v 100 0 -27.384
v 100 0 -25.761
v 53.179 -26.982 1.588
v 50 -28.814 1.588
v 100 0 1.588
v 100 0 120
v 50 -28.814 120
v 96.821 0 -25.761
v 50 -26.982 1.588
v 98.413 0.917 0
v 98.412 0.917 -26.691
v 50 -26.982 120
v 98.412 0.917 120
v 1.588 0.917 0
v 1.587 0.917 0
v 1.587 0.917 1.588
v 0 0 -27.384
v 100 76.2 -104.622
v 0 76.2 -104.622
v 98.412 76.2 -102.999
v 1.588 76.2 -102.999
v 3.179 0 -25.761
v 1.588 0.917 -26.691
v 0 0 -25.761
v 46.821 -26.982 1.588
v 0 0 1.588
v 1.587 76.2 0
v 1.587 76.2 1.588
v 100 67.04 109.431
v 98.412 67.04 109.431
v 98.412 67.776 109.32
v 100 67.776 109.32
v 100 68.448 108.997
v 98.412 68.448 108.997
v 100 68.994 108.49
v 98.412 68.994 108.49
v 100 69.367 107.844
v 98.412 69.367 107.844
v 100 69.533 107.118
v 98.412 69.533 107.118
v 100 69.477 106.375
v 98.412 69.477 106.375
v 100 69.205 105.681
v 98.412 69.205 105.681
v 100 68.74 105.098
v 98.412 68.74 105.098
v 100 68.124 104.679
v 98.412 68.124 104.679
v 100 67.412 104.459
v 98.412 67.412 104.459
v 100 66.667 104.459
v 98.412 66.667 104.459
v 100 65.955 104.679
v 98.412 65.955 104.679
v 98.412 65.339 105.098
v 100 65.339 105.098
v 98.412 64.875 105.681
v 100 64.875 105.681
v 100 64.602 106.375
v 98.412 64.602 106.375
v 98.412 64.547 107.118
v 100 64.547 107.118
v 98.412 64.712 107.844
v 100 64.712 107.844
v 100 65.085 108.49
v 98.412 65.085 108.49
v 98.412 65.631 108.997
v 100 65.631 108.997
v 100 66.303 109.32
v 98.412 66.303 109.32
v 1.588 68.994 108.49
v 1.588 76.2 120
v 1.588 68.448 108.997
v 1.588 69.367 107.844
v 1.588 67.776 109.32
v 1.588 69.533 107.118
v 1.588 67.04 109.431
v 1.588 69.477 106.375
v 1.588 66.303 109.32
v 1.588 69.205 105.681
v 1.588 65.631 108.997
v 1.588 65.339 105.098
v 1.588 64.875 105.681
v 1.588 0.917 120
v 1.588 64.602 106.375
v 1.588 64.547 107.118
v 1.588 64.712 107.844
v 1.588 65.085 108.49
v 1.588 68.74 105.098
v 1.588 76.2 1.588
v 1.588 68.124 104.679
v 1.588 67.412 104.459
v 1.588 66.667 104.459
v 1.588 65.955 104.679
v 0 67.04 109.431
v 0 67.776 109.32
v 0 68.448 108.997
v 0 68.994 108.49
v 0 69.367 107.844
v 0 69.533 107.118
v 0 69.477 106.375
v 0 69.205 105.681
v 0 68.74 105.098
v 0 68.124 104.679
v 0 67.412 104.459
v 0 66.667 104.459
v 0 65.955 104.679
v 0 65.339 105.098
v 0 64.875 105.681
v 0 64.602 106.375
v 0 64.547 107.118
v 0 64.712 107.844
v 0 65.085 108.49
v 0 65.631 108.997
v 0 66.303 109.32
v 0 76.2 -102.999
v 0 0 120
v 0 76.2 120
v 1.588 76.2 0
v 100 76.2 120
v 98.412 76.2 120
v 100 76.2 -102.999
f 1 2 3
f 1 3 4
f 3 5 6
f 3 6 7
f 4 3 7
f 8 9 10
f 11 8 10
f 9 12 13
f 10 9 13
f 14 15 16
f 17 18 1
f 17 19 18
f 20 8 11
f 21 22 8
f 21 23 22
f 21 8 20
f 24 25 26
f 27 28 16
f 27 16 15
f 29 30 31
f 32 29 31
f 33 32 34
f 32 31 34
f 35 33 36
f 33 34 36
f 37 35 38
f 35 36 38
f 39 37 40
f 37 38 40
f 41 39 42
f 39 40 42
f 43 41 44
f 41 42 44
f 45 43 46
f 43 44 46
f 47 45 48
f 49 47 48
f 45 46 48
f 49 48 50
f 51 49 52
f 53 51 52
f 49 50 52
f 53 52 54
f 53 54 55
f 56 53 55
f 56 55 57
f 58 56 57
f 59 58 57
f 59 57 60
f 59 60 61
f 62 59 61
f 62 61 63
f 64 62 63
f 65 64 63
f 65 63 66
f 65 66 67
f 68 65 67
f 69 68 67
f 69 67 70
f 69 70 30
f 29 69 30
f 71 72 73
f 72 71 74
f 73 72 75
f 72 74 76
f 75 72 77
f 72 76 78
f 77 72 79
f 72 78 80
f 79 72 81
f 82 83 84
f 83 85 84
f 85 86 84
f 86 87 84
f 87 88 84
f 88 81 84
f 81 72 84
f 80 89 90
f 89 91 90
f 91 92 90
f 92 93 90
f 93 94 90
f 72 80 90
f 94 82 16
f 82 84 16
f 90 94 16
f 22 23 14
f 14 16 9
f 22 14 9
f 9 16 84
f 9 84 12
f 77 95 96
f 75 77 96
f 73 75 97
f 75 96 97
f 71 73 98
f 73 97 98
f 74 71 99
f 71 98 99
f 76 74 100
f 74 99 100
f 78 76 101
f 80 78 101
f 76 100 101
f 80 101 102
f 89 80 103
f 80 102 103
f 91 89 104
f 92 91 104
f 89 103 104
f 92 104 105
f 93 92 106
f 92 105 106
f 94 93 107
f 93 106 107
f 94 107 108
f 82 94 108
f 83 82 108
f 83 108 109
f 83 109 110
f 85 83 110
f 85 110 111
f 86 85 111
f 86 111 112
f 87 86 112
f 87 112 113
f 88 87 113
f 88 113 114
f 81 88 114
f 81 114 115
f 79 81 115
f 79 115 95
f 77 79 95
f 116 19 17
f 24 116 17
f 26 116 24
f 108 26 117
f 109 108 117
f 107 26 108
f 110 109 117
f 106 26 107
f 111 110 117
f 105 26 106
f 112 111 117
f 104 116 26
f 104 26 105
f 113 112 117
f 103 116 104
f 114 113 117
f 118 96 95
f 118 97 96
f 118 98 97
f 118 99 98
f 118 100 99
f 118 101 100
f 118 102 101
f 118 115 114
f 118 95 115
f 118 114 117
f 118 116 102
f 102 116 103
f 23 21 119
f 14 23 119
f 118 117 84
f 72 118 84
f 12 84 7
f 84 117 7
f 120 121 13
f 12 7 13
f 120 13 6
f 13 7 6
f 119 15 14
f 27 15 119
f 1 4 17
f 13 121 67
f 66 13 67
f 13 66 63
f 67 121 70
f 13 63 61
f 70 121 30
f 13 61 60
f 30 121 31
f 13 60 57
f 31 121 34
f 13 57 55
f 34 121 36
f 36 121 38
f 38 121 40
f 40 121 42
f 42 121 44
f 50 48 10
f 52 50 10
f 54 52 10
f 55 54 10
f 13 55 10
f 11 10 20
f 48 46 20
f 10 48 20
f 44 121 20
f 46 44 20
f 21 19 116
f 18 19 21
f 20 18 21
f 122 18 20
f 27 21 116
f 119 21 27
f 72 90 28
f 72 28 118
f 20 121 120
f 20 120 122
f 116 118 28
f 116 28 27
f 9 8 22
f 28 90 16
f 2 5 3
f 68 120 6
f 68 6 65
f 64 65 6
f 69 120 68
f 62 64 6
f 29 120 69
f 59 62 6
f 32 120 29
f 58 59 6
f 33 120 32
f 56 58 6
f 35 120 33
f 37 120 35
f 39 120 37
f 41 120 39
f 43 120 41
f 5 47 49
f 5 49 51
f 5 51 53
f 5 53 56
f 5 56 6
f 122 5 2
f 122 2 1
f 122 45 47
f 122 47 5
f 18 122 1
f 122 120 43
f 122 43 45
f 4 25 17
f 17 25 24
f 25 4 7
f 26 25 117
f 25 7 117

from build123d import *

# Parameters (mm, degrees)
BOSS_EXTRUDE2_DEPTH             = 76.2
BOSS_EXTRUDE3_DEPTH             = 118.4125
SKETCH5_W                       = 96.825174549
SKETCH5_H                       = 1.5875
CUT_EXTRUDE2_DEPTH              = 76.2
BOSS_EXTRUDE5_REACH             = 52
BOSS_EXTRUDE5_DIRECTION_2_REACH = 52
BOSS_EXTRUDE6_REACH             = 122.202
BOSS_EXTRUDE7_DEPTH             = 1.5875
BOSS_EXTRUDE8_DEPTH             = 1.5875
SKETCH15_W                      = 143.32634152
SKETCH15_H                      = 53.255725939
CUT_EXTRUDE3_DEPTH              = 264.5875
CUT_EXTRUDE4_DEPTH              = 264.5875
SKETCH18_R                      = 2.5
CUT_EXTRUDE5_DEPTH              = 264.5875


with BuildPart() as part:
    # Sketch1 → Boss-Extrude2 (new body)
    with BuildSketch(Plane(origin=(0, 0, 0), x_dir=(1, 0, 0), z_dir=(0, 1, 0))):
        Polygon((1.5875, -1.5875), (98.4125, -1.5875), (98.4125, -118.4125), (98.4125, -120), (100, -120), (100, 0), (0, 0), (0, -120), (1.5875, -120), (1.5875, -118.4125), align=None)
    extrude(amount=BOSS_EXTRUDE2_DEPTH)

    # Sketch2 → Boss-Extrude3 (add)
    with BuildSketch(Plane.XY.offset(120)):
        Polygon((0, 0), (1.5875, 0.917396042), (50, -26.981614962), (98.4125, 0.917396042), (100, 0), (50, -28.813850766), align=None)
    extrude(amount=-BOSS_EXTRUDE3_DEPTH)

    # Sketch5 → Cut-Extrude2 (cut)
    with BuildSketch(Plane(origin=(0, 76.2, 0), x_dir=(1, 0, 0), z_dir=(0, 1, 0))):
        with Locations((49.999912726, -0.79375)):
            Rectangle(SKETCH5_W, SKETCH5_H)
    extrude(amount=-CUT_EXTRUDE2_DEPTH, mode=Mode.SUBTRACT)

    # Boss-Extrude5: up to this face of the body (flat: up to its plane)
    boss_extrude5_end = Plane(part.part.faces().sort_by_distance((0, 38.1, 60))[0])
    # Sketch11 → Boss-Extrude5 (add, up to the picked face)
    with BuildSketch(Plane.ZY.offset(-50), mode=Mode.PRIVATE) as boss_extrude5_sk1:
        Polygon((1.5875, -26.981614962), (1.5875, -28.813850766), (-27.384499219, 0), (-25.76142568, 0), align=None)
    boss_extrude5_tool1 = split(extrude(boss_extrude5_sk1.sketch, amount=BOSS_EXTRUDE5_REACH, mode=Mode.PRIVATE), bisect_by=boss_extrude5_end, keep=Keep.BOTH, mode=Mode.PRIVATE)
    add(boss_extrude5_tool1.solids().sort_by_distance((50, -14.256717, -12.190864))[0])
    # Sketch11 → Boss-Extrude5 (add, up to the picked face)
    with BuildSketch(Plane.ZY.offset(-50), mode=Mode.PRIVATE) as boss_extrude5_sk2:
        Polygon((-27.384499219, 0), (-25.76142568, 0), (-117.814066128, 90.816324189), (-118.614630338, 90.004861602), align=None)
    boss_extrude5_tool2 = split(extrude(boss_extrude5_sk2.sketch, amount=BOSS_EXTRUDE5_REACH, mode=Mode.PRIVATE), bisect_by=boss_extrude5_end, keep=Keep.BOTH, mode=Mode.PRIVATE)
    add(boss_extrude5_tool2.solids().sort_by_distance((50, 45.2056, -72.392749))[0])

    # Boss-Extrude5 direction 2: up to this face of the body (flat: up to its plane)
    boss_extrude5_direction_2_end = Plane(part.part.faces().sort_by_distance((100, 38.1, 60))[0])
    # Sketch11 → Boss-Extrude5 direction 2 (add, up to the picked face)
    with BuildSketch(Plane.ZY.offset(-50), mode=Mode.PRIVATE) as boss_extrude5_direction_2_sk1:
        Polygon((1.5875, -26.981614962), (1.5875, -28.813850766), (-27.384499219, 0), (-25.76142568, 0), align=None)
    boss_extrude5_direction_2_tool1 = split(extrude(boss_extrude5_direction_2_sk1.sketch, amount=-BOSS_EXTRUDE5_DIRECTION_2_REACH, mode=Mode.PRIVATE), bisect_by=boss_extrude5_direction_2_end, keep=Keep.BOTH, mode=Mode.PRIVATE)
    add(boss_extrude5_direction_2_tool1.solids().sort_by_distance((50, -14.256717, -12.190864))[0])
    # Sketch11 → Boss-Extrude5 direction 2 (add, up to the picked face)
    with BuildSketch(Plane.ZY.offset(-50), mode=Mode.PRIVATE) as boss_extrude5_direction_2_sk2:
        Polygon((-27.384499219, 0), (-25.76142568, 0), (-117.814066128, 90.816324189), (-118.614630338, 90.004861602), align=None)
    boss_extrude5_direction_2_tool2 = split(extrude(boss_extrude5_direction_2_sk2.sketch, amount=-BOSS_EXTRUDE5_DIRECTION_2_REACH, mode=Mode.PRIVATE), bisect_by=boss_extrude5_direction_2_end, keep=Keep.BOTH, mode=Mode.PRIVATE)
    add(boss_extrude5_direction_2_tool2.solids().sort_by_distance((50, 45.2056, -72.392749))[0])

    # Boss-Extrude6: up to this face of the body (flat: up to its plane)
    boss_extrude6_end = Plane(part.part.faces().sort_by_distance((50, -14.406925383, -12.89849961))[0])
    # Sketch12 → Boss-Extrude6 (add, up to the picked face)
    with BuildSketch(Plane(origin=(0, 0, 1.5875), x_dir=(-1, 0, 0), z_dir=(0, 0, -1)), mode=Mode.PRIVATE) as boss_extrude6_sk1:
        Polygon((-50, -26.981614962), (-98.4125, 0.917396042), (-98.4125, 0), (-100, 0), (-53.179435853, -26.981614962), (-50, -28.813850766), (-46.820564147, -26.981614962), (0, 0), (0, 0.917396042), (-1.5875, 0.917396042), align=None)
    boss_extrude6_tool1 = split(extrude(boss_extrude6_sk1.sketch, amount=BOSS_EXTRUDE6_REACH, mode=Mode.PRIVATE), bisect_by=boss_extrude6_end, keep=Keep.BOTH, mode=Mode.PRIVATE)
    add(boss_extrude6_tool1.solids().sort_by_distance((25.272847, -13.93602, 1.5875))[0])

    # Sketch13 → Boss-Extrude7 (add)
    with BuildSketch(Plane.ZY):
        Polygon((0, 0.917396042), (0, 76.2), (-102.998764504, 76.2), (-26.691310574, 0.917396042), align=None)
    extrude(amount=-BOSS_EXTRUDE7_DEPTH)

    # Sketch14 → Boss-Extrude8 (add)
    with BuildSketch(Plane(origin=(100, 0, 0), x_dir=(0, 0, -1), z_dir=(1, 0, 0))):
        Polygon((0, 0), (25.76142568, 0), (102.998764504, 76.2), (0, 76.2), align=None)
    extrude(amount=-BOSS_EXTRUDE8_DEPTH)

    # Sketch15 → Cut-Extrude3 (cut)
    with BuildSketch(Plane.XY.offset(120)):
        with Locations((28.33682924, 102.82786297)):
            Rectangle(SKETCH15_W, SKETCH15_H)
    extrude(amount=-CUT_EXTRUDE3_DEPTH, mode=Mode.SUBTRACT)

    # Sketch16 → Cut-Extrude4 (cut)
    with BuildSketch(Plane.XY.offset(120)):
        Polygon((63.760723445, -52.692511686), (50, -28.813850766), (100, 0), (131.48806996, 0), (150.508378032, -66.092213095), align=None)
        Polygon((-24.631729482, 0), (0, 0), (50, -28.813850766), (-14.891819722, -42.472870615), align=None)
    extrude(amount=-CUT_EXTRUDE4_DEPTH, mode=Mode.SUBTRACT)

    # Sketch18 → Cut-Extrude5 (cut)
    with BuildSketch(Plane.ZY):
        with Locations((106.931013832, 67.039572628)):
            Circle(SKETCH18_R)
    extrude(amount=-CUT_EXTRUDE5_DEPTH, mode=Mode.SUBTRACT)


solid = part.part
